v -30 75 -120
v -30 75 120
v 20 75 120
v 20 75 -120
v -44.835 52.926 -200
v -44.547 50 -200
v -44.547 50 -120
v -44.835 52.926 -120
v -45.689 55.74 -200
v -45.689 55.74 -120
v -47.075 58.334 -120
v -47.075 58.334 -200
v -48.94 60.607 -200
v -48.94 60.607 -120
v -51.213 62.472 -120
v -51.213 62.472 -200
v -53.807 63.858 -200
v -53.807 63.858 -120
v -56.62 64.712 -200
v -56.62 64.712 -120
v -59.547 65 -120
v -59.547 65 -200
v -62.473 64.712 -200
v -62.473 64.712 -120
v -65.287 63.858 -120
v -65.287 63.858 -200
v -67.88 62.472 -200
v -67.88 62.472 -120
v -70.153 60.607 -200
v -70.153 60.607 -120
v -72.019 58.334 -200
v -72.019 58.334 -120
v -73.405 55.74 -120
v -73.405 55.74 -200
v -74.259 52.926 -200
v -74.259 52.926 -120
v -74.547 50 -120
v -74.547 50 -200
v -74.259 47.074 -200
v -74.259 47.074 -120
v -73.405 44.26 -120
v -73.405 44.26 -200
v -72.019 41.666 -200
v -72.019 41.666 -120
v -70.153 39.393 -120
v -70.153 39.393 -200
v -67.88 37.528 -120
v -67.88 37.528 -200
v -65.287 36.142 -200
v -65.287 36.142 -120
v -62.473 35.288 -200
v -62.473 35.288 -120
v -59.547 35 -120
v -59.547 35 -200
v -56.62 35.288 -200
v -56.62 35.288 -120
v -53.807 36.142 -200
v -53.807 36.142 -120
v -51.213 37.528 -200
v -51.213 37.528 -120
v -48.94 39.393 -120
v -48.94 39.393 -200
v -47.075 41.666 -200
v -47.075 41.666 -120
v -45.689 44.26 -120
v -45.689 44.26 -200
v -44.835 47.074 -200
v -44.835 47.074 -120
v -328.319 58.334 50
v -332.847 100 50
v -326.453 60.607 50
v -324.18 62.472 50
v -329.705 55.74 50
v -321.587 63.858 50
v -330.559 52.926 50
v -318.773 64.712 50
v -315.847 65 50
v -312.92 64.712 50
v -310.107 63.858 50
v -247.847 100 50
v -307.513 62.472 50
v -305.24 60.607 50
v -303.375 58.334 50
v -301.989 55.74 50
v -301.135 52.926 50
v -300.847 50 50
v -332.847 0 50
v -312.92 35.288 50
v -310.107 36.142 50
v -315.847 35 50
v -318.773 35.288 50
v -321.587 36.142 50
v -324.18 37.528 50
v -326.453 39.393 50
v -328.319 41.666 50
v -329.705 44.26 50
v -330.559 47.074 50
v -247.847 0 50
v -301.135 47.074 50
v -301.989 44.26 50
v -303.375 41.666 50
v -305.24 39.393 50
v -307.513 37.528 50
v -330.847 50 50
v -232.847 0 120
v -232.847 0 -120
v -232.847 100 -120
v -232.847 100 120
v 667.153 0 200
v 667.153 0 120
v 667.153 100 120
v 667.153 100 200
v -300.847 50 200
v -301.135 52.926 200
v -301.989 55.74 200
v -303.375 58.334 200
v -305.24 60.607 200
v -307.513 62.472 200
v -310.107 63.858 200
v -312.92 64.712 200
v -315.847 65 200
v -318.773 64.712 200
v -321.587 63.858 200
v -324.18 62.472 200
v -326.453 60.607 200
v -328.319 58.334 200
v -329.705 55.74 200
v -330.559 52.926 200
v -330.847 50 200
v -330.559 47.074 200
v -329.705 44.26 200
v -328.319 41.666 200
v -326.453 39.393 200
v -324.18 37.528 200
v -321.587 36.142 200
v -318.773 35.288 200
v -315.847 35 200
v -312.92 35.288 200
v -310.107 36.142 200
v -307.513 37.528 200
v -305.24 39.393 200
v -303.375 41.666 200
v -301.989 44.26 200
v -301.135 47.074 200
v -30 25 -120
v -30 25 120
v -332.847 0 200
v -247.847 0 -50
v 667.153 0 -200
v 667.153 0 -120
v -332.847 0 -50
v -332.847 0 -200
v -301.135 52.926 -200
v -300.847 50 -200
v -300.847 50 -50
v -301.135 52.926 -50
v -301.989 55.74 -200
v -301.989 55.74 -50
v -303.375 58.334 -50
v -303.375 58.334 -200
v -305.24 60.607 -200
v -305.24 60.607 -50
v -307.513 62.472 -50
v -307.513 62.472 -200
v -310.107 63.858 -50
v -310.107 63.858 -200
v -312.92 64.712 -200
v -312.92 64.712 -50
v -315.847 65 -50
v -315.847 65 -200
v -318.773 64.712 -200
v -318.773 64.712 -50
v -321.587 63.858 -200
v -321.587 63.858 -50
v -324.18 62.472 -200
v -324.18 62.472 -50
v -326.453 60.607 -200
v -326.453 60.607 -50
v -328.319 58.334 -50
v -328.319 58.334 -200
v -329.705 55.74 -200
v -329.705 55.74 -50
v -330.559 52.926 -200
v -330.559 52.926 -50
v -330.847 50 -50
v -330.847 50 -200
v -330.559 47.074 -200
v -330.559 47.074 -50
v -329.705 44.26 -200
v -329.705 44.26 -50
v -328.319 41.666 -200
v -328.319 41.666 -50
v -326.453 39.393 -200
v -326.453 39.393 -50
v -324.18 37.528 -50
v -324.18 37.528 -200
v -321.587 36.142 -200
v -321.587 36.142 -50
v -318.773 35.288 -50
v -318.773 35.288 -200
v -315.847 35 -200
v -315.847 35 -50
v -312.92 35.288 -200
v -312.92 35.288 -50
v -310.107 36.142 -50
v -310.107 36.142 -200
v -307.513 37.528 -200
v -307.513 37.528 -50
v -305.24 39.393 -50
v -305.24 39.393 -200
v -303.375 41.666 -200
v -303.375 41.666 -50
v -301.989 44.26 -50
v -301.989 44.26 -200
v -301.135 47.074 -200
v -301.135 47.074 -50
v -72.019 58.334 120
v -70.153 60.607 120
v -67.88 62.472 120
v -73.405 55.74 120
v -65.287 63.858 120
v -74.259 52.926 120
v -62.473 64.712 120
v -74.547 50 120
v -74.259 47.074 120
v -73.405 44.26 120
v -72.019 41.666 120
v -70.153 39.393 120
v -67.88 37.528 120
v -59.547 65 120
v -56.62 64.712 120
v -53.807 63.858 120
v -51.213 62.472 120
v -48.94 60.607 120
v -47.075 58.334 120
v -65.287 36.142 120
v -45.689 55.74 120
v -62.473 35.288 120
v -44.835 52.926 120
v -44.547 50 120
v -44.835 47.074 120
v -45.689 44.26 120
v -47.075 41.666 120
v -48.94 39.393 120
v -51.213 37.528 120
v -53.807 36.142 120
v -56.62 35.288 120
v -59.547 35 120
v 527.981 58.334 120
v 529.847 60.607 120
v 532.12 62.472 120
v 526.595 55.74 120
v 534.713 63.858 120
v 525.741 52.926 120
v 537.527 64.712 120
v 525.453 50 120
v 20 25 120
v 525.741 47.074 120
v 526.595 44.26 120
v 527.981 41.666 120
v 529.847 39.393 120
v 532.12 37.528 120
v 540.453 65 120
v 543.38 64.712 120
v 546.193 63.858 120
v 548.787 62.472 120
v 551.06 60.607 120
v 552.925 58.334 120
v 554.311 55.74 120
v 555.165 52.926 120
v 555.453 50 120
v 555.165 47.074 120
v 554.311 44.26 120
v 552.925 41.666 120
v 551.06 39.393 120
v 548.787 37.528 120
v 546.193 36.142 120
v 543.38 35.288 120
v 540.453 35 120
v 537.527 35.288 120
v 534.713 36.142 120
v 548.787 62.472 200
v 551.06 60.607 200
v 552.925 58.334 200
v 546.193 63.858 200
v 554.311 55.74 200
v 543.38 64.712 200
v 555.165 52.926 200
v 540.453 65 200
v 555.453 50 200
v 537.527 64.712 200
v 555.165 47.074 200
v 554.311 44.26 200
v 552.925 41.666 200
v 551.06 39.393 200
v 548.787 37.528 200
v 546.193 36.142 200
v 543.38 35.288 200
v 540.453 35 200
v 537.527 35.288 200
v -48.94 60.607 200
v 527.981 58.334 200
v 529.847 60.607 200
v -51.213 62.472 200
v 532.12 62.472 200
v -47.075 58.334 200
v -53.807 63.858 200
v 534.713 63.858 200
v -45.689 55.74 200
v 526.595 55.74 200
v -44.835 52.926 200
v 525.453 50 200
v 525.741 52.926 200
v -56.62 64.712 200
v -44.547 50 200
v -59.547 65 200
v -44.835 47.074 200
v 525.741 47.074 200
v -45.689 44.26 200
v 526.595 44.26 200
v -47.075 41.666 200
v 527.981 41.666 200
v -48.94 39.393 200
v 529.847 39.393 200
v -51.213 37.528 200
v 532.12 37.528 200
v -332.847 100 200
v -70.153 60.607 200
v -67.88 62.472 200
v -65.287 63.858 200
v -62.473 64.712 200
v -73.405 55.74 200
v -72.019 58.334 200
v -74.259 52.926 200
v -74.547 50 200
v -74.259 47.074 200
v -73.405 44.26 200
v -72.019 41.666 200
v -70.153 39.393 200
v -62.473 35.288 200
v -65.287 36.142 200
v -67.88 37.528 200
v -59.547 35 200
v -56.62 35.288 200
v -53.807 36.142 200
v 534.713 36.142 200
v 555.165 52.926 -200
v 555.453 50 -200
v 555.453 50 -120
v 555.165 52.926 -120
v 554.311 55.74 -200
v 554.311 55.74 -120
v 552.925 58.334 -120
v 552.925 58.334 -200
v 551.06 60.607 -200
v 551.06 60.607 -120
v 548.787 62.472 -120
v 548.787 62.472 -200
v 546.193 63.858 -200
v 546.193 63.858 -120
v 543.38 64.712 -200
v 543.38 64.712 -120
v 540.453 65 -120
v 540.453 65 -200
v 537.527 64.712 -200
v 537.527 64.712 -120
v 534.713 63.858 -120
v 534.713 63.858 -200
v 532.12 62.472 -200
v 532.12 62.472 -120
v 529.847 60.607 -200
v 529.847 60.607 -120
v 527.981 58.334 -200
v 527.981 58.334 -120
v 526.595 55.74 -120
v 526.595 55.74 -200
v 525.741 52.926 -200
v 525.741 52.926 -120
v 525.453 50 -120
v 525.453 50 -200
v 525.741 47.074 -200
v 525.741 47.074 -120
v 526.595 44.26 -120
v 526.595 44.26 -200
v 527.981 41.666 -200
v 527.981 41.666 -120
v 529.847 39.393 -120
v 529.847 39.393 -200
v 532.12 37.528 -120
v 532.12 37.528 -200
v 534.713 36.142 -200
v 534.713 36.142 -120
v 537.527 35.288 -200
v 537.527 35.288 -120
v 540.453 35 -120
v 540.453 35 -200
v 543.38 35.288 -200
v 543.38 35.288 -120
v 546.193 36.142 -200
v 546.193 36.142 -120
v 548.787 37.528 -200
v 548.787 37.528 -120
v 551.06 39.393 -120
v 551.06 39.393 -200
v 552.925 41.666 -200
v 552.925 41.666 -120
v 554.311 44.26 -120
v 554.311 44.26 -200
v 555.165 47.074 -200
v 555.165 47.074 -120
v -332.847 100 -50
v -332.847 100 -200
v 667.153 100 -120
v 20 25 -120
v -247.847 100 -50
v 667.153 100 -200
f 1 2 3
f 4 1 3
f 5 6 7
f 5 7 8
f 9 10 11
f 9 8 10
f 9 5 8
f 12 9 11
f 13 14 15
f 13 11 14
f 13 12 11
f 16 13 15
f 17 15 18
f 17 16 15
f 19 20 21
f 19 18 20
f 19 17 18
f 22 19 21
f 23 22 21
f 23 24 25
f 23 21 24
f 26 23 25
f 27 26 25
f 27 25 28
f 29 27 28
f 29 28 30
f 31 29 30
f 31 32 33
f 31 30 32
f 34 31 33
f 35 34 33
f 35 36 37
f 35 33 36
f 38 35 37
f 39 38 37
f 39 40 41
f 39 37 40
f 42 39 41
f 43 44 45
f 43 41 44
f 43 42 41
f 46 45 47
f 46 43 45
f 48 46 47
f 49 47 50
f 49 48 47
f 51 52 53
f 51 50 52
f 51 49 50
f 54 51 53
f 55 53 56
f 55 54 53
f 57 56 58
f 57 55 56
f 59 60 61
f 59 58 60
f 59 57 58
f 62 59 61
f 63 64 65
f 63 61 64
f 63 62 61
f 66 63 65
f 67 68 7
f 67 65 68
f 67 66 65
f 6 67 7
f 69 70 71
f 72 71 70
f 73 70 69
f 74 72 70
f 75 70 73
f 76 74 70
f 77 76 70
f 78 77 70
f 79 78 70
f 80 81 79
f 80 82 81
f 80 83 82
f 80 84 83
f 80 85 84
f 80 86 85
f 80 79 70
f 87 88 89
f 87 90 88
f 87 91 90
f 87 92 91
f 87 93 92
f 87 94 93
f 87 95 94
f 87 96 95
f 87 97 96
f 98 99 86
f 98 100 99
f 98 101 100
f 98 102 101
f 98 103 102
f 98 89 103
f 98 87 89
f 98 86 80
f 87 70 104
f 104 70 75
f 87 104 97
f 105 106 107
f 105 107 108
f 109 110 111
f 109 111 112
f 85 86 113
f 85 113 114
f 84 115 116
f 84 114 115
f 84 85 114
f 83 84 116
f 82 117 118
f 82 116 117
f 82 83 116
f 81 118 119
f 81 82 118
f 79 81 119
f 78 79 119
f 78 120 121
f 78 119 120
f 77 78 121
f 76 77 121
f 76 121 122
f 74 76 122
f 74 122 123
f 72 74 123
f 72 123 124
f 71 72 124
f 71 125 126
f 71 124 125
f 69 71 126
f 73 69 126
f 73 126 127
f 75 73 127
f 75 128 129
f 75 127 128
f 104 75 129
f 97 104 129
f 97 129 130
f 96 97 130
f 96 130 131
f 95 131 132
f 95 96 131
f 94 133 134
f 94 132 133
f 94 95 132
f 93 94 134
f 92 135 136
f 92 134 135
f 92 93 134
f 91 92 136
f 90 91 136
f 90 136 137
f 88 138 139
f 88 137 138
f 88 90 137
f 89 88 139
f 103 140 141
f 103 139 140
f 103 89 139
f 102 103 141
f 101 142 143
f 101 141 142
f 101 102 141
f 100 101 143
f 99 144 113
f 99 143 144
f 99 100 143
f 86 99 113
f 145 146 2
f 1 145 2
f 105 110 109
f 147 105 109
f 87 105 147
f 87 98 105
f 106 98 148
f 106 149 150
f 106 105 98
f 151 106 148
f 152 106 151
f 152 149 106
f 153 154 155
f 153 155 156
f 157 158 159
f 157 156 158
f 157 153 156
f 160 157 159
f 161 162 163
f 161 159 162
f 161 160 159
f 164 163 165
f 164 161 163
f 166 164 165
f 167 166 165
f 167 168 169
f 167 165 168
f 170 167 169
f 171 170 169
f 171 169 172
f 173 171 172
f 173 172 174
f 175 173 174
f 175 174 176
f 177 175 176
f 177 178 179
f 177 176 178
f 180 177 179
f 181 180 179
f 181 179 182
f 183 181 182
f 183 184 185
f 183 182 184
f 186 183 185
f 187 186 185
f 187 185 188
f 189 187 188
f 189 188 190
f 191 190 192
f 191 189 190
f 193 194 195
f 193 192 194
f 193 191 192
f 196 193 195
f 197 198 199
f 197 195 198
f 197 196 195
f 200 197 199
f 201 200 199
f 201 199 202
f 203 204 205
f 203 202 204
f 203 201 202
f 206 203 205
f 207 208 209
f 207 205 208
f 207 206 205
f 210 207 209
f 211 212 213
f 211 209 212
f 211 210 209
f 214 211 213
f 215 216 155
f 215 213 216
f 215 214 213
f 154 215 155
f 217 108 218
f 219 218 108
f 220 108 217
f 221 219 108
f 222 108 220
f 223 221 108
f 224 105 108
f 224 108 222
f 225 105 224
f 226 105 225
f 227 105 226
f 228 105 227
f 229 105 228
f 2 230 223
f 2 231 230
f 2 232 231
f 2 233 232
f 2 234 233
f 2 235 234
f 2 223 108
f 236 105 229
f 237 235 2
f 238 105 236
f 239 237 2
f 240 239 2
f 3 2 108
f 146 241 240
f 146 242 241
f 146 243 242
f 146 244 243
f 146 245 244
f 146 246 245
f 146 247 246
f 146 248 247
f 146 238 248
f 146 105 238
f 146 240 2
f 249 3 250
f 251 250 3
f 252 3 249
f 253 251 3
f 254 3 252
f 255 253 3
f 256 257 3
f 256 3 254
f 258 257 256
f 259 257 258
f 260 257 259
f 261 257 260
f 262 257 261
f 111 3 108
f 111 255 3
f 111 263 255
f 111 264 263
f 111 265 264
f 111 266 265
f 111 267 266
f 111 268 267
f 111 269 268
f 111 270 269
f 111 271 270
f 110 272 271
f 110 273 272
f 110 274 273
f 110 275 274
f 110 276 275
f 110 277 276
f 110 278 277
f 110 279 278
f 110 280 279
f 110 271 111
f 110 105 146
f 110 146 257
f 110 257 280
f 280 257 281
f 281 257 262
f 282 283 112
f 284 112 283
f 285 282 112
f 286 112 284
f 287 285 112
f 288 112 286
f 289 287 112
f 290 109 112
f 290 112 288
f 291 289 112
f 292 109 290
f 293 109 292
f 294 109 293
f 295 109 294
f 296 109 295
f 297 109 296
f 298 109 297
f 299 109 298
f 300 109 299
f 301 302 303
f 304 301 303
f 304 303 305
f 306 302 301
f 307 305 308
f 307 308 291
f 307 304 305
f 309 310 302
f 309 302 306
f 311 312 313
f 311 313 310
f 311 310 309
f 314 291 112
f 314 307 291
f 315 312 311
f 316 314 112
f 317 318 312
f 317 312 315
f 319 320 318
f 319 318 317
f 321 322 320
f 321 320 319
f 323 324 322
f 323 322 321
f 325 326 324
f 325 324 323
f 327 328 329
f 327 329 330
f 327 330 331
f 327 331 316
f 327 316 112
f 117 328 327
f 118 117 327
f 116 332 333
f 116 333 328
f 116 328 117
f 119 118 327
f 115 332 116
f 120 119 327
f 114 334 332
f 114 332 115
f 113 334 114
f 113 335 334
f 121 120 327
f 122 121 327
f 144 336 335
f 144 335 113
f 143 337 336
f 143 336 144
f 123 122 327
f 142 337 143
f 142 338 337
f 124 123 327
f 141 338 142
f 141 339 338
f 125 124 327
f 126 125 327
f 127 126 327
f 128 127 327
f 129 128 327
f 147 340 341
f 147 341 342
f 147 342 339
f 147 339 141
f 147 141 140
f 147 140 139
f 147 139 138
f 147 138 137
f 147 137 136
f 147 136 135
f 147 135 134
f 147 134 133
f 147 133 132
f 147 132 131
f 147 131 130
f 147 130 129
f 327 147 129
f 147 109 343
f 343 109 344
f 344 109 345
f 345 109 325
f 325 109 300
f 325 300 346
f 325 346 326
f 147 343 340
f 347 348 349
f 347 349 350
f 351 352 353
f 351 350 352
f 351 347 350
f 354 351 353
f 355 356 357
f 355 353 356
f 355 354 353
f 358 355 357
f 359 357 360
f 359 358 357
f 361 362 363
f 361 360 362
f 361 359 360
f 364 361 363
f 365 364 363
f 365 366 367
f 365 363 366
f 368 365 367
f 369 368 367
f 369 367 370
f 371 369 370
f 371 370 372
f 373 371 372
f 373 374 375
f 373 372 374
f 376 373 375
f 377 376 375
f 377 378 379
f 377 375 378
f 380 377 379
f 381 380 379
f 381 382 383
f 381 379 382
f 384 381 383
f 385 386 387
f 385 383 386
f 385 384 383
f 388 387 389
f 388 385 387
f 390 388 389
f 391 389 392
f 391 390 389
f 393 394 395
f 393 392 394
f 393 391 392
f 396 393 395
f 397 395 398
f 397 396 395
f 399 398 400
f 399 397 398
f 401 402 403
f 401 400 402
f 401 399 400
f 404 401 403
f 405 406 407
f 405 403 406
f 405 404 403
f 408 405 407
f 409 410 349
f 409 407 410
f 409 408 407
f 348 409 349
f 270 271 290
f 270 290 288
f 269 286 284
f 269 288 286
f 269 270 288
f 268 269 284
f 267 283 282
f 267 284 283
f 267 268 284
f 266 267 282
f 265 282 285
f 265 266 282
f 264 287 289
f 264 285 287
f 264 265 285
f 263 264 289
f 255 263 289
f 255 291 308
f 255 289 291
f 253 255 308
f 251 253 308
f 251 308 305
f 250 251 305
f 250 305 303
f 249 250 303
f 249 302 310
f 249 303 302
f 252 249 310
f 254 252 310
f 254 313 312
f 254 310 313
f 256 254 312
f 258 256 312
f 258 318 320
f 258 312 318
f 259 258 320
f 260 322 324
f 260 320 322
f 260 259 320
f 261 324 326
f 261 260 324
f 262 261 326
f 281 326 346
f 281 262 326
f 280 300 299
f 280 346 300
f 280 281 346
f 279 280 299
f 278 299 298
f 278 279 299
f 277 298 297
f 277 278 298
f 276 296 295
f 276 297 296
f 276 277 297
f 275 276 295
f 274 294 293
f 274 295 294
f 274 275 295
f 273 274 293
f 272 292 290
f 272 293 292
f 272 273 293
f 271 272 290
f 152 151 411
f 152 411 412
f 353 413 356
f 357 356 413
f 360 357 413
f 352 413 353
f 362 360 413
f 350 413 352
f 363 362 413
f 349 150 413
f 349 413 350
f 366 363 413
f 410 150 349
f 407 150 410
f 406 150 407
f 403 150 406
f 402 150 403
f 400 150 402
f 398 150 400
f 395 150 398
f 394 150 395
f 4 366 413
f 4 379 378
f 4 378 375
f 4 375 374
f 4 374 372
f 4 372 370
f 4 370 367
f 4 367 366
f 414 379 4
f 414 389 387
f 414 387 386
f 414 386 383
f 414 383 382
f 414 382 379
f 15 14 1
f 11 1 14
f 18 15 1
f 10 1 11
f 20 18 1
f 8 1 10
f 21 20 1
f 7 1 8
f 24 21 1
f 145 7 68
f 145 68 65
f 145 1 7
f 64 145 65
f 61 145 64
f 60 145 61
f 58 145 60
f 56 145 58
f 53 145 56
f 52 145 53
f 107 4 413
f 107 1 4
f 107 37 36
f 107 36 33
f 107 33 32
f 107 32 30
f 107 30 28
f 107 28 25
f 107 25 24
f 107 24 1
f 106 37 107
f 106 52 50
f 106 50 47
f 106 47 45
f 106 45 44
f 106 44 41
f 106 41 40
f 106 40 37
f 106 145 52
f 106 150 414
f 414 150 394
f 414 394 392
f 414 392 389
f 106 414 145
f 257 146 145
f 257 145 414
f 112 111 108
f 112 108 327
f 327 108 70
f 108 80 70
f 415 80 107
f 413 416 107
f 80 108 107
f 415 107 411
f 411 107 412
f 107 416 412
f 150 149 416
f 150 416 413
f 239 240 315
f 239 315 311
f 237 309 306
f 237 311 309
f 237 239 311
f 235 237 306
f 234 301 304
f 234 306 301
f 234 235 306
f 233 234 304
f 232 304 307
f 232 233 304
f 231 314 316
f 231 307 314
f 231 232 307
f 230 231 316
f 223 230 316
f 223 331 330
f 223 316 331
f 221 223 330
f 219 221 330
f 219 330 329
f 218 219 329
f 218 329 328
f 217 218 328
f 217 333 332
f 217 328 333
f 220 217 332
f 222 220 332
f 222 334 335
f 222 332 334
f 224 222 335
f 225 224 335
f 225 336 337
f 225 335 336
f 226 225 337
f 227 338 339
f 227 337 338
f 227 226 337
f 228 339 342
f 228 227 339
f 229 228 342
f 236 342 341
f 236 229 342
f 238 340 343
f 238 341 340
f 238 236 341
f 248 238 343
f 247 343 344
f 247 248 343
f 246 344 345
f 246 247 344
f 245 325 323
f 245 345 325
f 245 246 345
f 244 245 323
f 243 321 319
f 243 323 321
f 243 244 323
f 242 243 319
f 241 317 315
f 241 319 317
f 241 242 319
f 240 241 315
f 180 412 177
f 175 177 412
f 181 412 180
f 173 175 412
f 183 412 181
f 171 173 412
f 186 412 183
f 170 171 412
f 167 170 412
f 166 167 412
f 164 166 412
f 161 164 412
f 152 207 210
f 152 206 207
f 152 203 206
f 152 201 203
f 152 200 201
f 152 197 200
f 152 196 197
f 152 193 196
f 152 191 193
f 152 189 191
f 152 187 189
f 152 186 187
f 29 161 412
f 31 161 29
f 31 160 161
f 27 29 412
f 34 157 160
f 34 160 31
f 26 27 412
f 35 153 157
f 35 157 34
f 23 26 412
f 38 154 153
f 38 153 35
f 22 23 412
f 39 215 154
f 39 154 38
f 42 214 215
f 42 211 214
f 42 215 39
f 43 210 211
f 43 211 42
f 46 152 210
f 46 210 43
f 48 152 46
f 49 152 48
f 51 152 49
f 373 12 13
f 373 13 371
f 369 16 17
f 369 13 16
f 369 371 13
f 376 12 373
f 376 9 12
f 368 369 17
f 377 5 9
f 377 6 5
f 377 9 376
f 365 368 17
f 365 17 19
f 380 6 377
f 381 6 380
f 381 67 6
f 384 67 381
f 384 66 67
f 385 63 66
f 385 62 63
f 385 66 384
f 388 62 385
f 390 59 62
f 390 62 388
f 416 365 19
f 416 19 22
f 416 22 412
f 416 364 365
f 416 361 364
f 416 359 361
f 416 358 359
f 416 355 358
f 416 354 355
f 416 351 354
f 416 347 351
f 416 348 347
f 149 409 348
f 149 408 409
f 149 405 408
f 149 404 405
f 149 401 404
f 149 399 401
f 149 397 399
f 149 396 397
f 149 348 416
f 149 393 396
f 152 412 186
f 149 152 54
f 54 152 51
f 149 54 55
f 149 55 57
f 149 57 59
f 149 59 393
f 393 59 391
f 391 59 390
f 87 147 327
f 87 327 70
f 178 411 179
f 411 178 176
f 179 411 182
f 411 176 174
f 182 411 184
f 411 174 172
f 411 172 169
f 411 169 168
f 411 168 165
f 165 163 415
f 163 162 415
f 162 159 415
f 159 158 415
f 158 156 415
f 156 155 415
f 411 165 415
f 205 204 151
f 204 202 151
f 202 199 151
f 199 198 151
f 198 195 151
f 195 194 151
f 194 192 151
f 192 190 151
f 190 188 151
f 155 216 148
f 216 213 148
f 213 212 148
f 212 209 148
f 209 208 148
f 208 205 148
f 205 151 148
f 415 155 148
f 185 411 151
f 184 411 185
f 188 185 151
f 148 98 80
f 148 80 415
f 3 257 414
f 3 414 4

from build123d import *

# Parameters (mm, degrees)
ESTRUSIONE_ESTRUSIONE1_DEPTH             = 100
TAGLIO_ESTRUSIONE5_DEPTH                 = 704.628710974
TAGLIO_ESTRUSIONE5_DEPTH_BACK            = 704.628710974
SCHIZZO2_R                               = 15
TAGLIO_ESTRUSIONE6_DEPTH                 = 704.628710974
TAGLIO_ESTRUSIONE6_DEPTH_BACK            = 704.628710974
SCHIZZO3_W                               = 85
SCHIZZO3_H                               = 100
ESTRUSIONE_ESTRUSIONE2_REACH             = 705.629
SCHIZZO4_W                               = 50
SCHIZZO4_H                               = 50
ESTRUSIONE_ESTRUSIONE2_DIRECTION_2_REACH = 705.629


with BuildPart() as part:
    # Schizzo1 → Estrusione-Estrusione1 (new body)
    with BuildSketch(Plane(origin=(0, 0, 0), x_dir=(1, 0, 0), z_dir=(0, 1, 0))):
        Polygon((-332.846822006, -200), (-332.846822006, 200), (667.153177994, 200), (667.153177994, 120), (-232.846822006, 120), (-232.846822006, -120), (667.153177994, -120), (667.153177994, -200), align=None)
    extrude(amount=ESTRUSIONE_ESTRUSIONE1_DEPTH)

    # Schizzo2 → Taglio-Estrusione5 (cut, two sides: drawn at the far end of the back side and taken through both)
    with BuildSketch(Plane.XY.offset(-TAGLIO_ESTRUSIONE5_DEPTH_BACK)):
        with Locations((-315.846822006, 50)):
            Circle(SCHIZZO2_R)
        with Locations((-59.546822006, 50)):
            Circle(SCHIZZO2_R)
        with Locations((540.453177994, 50)):
            Circle(SCHIZZO2_R)
    extrude(amount=TAGLIO_ESTRUSIONE5_DEPTH + TAGLIO_ESTRUSIONE5_DEPTH_BACK, mode=Mode.SUBTRACT)

    # Schizzo3 → Taglio-Estrusione6 (cut, two sides: drawn at the far end of the back side and taken through both)
    with BuildSketch(Plane(origin=(0, 0, 0), x_dir=(1, 0, 0), z_dir=(0, 1, 0)).offset(-TAGLIO_ESTRUSIONE6_DEPTH_BACK)):
        with Locations((-290.346822006, 0)):
            Rectangle(SCHIZZO3_W, SCHIZZO3_H)
    extrude(amount=TAGLIO_ESTRUSIONE6_DEPTH + TAGLIO_ESTRUSIONE6_DEPTH_BACK, mode=Mode.SUBTRACT)

    # Schizzo4 → Estrusione-Estrusione2 (add, up to next)
    with BuildSketch(Plane.XY, mode=Mode.PRIVATE) as estrusione_estrusione2_sk1:
        with Locations((-5, 50)):
            Rectangle(SCHIZZO4_W, SCHIZZO4_H)
    estrusione_estrusione2_tool1 = extrude(estrusione_estrusione2_sk1.sketch, amount=ESTRUSIONE_ESTRUSIONE2_REACH, mode=Mode.PRIVATE) - part.part
    add(estrusione_estrusione2_tool1.solids().sort_by_distance((-5, 50, 0))[0])

    # Schizzo4 → Estrusione-Estrusione2 direction 2 (add, up to next)
    with BuildSketch(Plane.XY, mode=Mode.PRIVATE) as estrusione_estrusione2_direction_2_sk1:
        with Locations((-5, 50)):
            Rectangle(SCHIZZO4_W, SCHIZZO4_H)
    estrusione_estrusione2_direction_2_tool1 = extrude(estrusione_estrusione2_direction_2_sk1.sketch, amount=-ESTRUSIONE_ESTRUSIONE2_DIRECTION_2_REACH, mode=Mode.PRIVATE) - part.part
    add(estrusione_estrusione2_direction_2_tool1.solids().sort_by_distance((-5, 50, 0))[0])


solid = part.part
